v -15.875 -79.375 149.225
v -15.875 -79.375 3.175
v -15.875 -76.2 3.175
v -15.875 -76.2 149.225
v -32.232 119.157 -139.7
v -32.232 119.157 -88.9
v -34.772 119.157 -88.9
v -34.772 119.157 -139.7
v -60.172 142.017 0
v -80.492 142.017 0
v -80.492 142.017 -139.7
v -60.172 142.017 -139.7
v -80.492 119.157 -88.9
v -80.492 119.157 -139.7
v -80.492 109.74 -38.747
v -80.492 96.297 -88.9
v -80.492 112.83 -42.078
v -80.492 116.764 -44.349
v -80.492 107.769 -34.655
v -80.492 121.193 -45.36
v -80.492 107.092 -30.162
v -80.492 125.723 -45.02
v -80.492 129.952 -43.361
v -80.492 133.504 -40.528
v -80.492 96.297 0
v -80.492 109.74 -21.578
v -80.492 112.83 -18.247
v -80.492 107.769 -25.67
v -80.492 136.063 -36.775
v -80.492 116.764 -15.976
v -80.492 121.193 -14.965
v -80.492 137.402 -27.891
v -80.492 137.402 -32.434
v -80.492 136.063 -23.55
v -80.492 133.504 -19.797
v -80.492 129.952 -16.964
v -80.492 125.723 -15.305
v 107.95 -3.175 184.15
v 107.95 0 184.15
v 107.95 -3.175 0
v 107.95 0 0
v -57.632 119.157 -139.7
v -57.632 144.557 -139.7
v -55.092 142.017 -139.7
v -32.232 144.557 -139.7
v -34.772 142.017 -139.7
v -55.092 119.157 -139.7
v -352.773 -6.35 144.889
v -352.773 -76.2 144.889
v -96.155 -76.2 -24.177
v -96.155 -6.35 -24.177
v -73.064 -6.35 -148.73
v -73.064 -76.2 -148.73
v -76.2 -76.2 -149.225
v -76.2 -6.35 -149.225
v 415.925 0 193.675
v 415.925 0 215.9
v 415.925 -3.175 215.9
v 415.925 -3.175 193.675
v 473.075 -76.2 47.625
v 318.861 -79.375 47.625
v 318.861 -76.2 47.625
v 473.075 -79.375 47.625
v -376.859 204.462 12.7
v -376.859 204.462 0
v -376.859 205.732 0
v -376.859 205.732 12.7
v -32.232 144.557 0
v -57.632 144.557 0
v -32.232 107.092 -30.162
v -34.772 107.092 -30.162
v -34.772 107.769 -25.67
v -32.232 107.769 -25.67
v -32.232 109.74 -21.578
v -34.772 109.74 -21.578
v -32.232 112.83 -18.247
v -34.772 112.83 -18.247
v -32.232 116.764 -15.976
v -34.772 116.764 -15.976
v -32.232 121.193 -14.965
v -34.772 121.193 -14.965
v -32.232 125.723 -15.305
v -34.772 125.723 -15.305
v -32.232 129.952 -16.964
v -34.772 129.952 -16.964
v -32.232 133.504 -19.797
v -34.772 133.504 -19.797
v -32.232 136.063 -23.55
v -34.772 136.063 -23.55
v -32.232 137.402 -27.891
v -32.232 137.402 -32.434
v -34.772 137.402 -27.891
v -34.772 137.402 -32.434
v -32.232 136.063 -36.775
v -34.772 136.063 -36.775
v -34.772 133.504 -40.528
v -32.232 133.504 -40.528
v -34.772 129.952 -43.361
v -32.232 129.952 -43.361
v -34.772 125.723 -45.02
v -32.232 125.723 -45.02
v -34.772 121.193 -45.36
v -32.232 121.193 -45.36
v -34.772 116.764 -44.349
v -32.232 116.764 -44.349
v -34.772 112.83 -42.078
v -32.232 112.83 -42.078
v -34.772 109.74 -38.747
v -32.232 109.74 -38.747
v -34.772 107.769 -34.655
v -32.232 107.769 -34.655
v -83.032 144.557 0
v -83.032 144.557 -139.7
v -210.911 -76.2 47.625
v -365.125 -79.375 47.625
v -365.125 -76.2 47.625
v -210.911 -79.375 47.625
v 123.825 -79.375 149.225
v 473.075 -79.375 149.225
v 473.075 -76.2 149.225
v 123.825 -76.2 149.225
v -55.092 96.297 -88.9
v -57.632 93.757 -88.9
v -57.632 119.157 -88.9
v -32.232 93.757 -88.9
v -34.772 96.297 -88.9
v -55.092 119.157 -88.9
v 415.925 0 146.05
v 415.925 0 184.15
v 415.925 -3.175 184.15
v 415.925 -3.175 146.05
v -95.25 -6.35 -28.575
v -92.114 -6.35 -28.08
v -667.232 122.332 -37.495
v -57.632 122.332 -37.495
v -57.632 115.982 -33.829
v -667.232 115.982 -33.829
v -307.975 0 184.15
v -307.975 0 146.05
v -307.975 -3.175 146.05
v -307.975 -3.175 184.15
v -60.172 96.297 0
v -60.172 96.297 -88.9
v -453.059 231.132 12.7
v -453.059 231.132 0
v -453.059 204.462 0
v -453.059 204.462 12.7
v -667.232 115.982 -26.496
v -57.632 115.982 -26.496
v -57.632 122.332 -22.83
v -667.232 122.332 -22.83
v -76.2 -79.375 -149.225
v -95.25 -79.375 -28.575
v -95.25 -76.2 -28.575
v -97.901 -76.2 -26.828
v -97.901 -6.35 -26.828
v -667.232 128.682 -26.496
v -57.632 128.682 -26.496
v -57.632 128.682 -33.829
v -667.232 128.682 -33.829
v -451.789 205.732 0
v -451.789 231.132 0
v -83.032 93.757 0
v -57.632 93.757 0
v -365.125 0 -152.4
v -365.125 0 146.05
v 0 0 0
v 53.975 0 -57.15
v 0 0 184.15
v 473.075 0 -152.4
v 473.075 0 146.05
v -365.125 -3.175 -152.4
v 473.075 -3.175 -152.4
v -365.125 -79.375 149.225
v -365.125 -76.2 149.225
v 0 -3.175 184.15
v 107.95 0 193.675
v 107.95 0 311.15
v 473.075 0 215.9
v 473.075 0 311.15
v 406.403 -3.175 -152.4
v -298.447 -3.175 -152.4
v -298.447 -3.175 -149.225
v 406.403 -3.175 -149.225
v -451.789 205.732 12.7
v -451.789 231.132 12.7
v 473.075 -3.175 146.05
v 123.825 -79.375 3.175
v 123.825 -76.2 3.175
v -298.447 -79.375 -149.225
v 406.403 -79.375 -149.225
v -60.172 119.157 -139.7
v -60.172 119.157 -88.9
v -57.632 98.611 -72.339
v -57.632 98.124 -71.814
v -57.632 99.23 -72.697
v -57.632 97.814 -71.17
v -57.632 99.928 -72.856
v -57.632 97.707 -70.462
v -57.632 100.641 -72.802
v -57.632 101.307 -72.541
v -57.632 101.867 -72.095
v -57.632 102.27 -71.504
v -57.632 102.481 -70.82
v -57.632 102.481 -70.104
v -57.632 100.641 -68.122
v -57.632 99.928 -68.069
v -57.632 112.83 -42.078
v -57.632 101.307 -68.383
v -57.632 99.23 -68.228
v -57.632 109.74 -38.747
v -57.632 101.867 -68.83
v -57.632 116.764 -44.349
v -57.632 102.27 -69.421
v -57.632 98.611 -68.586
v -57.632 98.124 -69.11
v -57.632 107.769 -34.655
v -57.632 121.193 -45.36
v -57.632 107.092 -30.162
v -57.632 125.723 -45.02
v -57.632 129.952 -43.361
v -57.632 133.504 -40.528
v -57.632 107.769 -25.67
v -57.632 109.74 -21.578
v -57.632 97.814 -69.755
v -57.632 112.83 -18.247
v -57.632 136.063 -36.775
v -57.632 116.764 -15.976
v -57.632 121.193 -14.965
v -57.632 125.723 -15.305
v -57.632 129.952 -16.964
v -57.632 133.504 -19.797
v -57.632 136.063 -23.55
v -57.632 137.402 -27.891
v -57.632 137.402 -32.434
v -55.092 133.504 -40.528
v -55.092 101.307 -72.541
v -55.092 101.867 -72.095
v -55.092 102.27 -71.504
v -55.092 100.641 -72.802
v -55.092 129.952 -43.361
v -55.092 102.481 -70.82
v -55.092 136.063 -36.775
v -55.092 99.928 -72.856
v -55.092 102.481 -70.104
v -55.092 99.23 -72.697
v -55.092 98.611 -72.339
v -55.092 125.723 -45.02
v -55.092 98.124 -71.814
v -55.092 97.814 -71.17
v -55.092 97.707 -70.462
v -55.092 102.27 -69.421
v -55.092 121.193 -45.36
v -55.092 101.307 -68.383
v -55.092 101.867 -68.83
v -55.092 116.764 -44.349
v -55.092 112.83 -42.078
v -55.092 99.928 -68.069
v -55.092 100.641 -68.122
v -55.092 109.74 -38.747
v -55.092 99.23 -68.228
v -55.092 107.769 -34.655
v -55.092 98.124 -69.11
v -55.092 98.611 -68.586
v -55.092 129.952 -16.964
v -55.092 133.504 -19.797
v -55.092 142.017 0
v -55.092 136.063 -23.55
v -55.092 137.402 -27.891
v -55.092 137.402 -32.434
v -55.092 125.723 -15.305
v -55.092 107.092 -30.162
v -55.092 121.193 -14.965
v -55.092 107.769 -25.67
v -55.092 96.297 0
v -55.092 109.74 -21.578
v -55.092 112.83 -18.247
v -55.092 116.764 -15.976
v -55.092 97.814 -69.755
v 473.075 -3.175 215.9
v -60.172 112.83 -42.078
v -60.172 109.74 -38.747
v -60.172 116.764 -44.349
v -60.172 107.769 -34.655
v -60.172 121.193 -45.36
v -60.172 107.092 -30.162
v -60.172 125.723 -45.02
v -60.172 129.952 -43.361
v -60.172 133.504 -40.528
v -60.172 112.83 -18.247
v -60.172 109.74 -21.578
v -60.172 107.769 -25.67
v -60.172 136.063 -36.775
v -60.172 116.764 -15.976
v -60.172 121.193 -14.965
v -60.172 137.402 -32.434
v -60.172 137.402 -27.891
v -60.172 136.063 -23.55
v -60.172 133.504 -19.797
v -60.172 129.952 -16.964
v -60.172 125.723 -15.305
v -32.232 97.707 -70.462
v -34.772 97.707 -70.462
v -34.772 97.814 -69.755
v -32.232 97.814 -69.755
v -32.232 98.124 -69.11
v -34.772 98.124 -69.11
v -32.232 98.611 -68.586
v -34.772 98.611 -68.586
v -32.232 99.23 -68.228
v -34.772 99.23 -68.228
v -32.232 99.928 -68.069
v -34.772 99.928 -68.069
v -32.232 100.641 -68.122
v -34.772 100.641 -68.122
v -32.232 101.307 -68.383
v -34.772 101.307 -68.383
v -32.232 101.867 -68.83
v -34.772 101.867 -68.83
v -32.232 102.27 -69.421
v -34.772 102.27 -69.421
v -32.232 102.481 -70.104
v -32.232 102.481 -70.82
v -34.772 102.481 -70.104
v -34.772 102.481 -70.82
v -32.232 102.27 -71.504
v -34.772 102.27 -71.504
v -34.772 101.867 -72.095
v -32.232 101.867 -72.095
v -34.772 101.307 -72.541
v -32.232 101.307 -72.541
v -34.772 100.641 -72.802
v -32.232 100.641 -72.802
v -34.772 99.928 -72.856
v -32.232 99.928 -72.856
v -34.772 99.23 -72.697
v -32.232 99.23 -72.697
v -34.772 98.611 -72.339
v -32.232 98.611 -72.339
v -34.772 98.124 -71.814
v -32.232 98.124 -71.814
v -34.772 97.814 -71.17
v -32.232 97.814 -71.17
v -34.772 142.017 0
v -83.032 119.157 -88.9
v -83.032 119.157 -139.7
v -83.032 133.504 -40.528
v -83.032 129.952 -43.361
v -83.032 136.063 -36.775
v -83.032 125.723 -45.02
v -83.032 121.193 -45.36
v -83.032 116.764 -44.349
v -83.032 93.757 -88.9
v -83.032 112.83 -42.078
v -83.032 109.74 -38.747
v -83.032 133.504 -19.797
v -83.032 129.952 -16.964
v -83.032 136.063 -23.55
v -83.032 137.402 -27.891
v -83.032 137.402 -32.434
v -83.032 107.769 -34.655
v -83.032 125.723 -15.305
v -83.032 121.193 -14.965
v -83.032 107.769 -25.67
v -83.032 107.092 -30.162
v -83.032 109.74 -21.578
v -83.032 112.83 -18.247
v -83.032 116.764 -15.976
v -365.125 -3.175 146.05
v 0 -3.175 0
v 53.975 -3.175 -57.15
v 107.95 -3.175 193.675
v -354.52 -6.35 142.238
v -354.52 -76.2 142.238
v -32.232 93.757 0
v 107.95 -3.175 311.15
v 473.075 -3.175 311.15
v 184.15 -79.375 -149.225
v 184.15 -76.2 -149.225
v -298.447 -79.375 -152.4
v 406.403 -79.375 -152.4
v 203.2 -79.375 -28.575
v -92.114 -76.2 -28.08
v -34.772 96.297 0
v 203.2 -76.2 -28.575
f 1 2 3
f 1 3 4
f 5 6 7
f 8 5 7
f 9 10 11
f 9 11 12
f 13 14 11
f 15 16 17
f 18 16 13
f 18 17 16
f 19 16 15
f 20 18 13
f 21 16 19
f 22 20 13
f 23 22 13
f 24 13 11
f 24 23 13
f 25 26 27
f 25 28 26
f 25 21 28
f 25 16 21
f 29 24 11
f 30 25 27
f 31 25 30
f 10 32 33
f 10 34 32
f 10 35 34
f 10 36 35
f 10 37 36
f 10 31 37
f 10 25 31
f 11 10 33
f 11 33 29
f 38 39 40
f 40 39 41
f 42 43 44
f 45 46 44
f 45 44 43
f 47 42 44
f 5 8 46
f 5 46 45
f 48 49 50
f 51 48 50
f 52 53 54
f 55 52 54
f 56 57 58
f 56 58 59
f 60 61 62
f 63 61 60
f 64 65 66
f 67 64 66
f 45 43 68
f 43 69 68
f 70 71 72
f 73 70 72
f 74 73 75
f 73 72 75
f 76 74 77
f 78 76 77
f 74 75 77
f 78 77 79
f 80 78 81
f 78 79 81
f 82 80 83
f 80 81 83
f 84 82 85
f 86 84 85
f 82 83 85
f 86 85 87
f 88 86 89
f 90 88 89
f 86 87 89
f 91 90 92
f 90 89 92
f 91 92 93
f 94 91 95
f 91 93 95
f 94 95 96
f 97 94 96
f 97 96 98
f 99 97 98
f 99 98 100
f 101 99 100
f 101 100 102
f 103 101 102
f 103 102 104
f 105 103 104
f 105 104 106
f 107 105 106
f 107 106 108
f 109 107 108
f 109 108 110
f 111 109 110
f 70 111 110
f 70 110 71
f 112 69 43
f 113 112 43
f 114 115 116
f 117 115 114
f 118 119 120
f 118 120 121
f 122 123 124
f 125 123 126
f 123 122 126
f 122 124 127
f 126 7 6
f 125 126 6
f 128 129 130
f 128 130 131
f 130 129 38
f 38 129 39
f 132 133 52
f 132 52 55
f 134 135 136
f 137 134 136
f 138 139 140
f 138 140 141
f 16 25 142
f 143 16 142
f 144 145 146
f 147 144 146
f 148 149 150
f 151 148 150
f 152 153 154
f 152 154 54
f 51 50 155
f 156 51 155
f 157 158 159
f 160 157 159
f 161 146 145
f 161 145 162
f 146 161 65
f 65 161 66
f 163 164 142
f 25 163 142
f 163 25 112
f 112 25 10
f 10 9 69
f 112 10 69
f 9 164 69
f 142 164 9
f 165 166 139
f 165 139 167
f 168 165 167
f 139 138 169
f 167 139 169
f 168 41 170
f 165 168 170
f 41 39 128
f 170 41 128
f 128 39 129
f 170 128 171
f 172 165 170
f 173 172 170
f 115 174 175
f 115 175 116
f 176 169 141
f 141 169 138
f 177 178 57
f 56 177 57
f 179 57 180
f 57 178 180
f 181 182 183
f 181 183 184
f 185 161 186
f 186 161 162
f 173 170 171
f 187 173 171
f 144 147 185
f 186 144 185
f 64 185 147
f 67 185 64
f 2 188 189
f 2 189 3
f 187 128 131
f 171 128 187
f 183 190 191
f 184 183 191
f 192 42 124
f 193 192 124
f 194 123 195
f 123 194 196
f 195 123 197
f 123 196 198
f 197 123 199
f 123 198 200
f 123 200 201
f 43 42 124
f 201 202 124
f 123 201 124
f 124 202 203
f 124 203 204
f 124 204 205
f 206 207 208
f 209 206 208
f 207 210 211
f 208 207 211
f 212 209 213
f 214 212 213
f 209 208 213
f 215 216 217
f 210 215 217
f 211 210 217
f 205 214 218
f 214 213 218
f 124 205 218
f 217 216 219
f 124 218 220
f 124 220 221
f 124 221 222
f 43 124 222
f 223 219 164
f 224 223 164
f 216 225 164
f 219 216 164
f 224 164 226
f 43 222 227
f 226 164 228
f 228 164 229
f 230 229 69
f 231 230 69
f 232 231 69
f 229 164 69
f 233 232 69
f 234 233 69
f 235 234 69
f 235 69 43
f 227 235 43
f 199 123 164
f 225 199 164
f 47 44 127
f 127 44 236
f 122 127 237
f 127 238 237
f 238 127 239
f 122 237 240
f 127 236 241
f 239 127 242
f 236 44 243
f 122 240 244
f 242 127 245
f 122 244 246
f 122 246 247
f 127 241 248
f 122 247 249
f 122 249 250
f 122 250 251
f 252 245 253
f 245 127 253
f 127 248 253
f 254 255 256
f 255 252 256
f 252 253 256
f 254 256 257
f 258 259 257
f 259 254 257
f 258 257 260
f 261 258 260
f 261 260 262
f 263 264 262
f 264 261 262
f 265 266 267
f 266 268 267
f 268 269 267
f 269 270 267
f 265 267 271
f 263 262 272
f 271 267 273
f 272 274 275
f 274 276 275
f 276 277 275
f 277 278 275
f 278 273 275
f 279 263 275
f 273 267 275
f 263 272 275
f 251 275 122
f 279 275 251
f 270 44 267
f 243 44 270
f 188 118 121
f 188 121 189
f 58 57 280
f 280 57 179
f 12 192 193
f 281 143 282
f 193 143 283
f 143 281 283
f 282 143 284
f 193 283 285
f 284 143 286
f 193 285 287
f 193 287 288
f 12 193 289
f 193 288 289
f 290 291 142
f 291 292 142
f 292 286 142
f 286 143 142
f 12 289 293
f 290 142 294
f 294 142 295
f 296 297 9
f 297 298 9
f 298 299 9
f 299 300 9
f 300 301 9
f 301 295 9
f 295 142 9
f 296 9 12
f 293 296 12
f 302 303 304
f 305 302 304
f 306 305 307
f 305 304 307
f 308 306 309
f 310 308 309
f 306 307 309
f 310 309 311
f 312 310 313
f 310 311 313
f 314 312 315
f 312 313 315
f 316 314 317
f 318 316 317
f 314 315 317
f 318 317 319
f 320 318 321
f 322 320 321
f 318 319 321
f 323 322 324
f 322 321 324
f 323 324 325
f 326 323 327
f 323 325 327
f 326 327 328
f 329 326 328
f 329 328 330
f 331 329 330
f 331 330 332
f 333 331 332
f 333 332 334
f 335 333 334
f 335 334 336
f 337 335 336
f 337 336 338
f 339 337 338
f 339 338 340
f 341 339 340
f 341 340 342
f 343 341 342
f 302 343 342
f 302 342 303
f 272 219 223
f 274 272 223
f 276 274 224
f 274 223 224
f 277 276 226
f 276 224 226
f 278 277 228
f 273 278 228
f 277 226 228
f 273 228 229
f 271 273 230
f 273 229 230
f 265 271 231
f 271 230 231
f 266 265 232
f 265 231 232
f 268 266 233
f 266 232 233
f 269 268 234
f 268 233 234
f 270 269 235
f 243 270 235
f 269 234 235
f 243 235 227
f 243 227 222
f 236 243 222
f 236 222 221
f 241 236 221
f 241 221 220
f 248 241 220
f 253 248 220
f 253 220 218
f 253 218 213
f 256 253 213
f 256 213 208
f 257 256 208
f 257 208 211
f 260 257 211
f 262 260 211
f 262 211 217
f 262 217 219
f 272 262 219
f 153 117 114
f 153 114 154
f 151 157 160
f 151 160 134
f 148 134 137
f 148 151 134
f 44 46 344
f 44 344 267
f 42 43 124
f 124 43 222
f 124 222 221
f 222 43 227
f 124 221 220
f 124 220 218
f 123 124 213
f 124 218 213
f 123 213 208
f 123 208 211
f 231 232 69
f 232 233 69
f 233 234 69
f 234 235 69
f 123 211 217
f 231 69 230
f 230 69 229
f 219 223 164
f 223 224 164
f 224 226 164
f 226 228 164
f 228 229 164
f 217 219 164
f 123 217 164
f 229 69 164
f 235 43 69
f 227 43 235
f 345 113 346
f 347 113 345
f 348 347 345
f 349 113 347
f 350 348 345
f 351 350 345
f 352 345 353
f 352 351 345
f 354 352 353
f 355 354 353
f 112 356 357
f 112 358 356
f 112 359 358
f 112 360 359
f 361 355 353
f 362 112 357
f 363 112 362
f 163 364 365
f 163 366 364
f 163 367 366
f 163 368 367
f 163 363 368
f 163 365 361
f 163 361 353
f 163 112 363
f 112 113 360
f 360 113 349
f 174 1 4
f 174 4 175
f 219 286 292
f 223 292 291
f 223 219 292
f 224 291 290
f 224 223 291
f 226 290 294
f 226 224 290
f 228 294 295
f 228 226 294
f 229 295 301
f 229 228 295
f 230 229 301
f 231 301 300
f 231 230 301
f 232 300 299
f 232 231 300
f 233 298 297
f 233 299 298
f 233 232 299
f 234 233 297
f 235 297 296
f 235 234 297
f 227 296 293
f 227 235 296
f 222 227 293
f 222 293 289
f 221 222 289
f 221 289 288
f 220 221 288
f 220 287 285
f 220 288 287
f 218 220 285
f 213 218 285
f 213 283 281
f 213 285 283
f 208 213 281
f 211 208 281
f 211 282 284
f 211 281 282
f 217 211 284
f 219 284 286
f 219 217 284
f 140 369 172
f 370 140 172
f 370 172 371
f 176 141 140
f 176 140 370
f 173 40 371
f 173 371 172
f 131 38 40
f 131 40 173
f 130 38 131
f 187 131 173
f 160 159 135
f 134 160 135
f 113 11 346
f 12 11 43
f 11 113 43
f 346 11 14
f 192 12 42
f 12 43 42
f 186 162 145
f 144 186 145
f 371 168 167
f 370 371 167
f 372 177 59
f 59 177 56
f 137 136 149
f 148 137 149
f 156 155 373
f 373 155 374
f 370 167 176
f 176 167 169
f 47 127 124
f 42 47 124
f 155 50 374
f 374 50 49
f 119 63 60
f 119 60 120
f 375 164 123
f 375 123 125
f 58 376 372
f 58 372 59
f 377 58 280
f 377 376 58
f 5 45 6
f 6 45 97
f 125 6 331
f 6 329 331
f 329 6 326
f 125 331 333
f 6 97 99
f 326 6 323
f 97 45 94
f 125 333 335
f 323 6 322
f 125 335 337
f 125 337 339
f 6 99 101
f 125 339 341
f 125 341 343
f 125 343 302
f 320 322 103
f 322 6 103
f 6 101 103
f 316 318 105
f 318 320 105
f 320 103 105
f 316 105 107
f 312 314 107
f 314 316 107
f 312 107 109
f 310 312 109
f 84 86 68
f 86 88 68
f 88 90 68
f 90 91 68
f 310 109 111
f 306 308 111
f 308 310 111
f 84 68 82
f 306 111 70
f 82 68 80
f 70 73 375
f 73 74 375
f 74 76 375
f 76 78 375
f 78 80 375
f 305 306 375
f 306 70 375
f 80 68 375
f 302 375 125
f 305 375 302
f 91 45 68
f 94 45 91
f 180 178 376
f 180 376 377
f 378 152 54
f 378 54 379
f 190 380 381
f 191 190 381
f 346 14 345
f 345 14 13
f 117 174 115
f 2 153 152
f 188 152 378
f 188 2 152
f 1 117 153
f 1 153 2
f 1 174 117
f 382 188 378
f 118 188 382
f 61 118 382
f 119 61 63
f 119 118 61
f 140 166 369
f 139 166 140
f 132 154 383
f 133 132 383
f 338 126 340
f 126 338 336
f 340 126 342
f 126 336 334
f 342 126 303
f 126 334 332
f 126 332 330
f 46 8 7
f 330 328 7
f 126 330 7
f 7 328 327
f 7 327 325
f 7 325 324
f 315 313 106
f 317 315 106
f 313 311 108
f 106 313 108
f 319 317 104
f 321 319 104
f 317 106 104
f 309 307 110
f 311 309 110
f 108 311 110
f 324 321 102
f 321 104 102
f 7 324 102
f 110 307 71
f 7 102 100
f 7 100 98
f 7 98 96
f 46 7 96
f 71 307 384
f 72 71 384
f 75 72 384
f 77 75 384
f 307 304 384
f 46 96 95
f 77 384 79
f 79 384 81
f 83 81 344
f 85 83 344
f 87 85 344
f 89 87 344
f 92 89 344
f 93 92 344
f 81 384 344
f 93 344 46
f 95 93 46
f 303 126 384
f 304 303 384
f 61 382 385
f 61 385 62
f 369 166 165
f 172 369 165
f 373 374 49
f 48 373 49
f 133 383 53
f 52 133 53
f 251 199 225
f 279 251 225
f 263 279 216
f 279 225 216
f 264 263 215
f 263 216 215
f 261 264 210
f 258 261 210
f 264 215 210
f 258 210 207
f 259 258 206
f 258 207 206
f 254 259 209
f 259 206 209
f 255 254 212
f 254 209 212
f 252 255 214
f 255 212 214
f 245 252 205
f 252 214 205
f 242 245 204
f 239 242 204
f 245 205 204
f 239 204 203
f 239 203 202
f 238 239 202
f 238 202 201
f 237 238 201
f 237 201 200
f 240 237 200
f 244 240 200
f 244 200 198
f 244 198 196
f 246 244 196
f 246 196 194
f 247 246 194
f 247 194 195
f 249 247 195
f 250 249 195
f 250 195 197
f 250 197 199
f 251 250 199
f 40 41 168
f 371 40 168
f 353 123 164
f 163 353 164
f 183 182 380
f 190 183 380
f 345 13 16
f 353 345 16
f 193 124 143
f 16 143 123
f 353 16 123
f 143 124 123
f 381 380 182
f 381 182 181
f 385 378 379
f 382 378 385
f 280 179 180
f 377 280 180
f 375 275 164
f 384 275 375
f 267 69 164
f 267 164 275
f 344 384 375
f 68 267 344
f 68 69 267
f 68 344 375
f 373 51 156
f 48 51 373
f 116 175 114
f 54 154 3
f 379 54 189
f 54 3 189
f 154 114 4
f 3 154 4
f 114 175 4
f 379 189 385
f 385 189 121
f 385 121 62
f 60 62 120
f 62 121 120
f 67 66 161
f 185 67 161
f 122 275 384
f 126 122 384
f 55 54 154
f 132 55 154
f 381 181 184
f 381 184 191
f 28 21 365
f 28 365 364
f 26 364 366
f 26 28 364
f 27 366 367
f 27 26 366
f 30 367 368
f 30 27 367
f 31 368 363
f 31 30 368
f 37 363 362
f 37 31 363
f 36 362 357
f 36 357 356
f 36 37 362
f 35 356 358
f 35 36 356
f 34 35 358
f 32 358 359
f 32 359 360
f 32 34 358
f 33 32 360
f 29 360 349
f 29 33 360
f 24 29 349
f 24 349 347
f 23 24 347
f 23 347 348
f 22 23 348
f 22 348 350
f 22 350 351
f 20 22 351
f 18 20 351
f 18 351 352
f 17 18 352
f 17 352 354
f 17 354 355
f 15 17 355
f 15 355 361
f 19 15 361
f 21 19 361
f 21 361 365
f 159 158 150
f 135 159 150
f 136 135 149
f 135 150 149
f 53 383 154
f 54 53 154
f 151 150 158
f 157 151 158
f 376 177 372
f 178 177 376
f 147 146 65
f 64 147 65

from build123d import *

# Parameters (mm, degrees)
F1_DEPTH  = 3.175
F2_W      = 704.85
F2_H      = 76.2
F3_DEPTH  = 3.175
F0_W      = 365.125
F0_H      = 117.475
F4_DEPTH  = 3.175
F6_DEPTH  = 3.175
F8_DEPTH  = 69.85
F10_DEPTH = 69.85
F11_W     = 25.4
F11_H     = 50.8
F11_W_2   = 20.32
F11_H_2   = 45.72
F12_DEPTH = 88.9
F13_R     = 15.24
F13_R_2   = 2.4003
F14_DEPTH = 25.4
F16_DEPTH = 609.6
F17_W     = 57.15
F17_H     = 38.1
F17_H_2   = 31.75
F18_DEPTH = 3.175
F20_DEPTH = 12.7
F22_DEPTH = 50.8
F23_R     = 15.24
F24_DEPTH = 25.4
F25_W     = 20.32
F25_H     = 45.72
F26_DEPTH = 139.7


# Not quite as in the source:
# - a length typed as a fraction of an inch, garbled in the dataset ("3 / 203.2 mm" for 3/8 in), is restored


with BuildPart() as f1:
    # F0 (on Front) → F1 (new body)
    with BuildSketch(Plane.XZ):
        Polygon((0, 184.15), (-365.125, 184.15), (-365.125, -152.4), (473.075, -152.4), (473.075, 184.15), (107.95, 184.15), (107.95, 0), (53.975, -57.15), (0, 0), align=None)
    extrude(amount=F1_DEPTH)


with BuildPart() as f3:
    # F2 (on face) → F3 (new body)
    with BuildSketch(Plane(origin=(0, 0, -152.4), x_dir=(1, 0, 0), z_dir=(0, 0, -1))):
        with Locations((53.9782664609, 41.275)):
            Rectangle(F2_W, F2_H)
    extrude(amount=-F3_DEPTH)


with BuildPart() as f4:
    # F0 (on Front) → F4 (new body)
    with BuildSketch(Plane.XZ):
        with Locations((290.5125, 252.4125)):
            Rectangle(F0_W, F0_H)
    extrude(amount=F4_DEPTH)


with BuildPart() as f6:
    # F5 (on face) → F6 (new body)
    with BuildSketch(Plane.XZ.offset(79.375)):
        Polygon((-15.875, 3.175), (-15.875, 149.225), (-365.125, 149.225), (-210.9107142857, 47.625), (-95.25, -28.575), (-76.2, -149.225), (184.15, -149.225), (203.2, -28.575), (318.8607142857, 47.625), (473.075, 149.225), (123.825, 149.225), (123.825, 3.175), align=None)
        Polygon((-210.9107142857, 47.625), (-365.125, 149.225), (-365.125, 47.625), align=None)
        Polygon((473.075, 47.625), (473.075, 149.225), (318.8607142857, 47.625), align=None)
    extrude(amount=-F6_DEPTH)


with BuildPart() as f8:
    # F7 (on face) → F8 (new body)
    with BuildSketch(Plane(origin=(0, -76.2, 0), x_dir=(-1, 0, 0), z_dir=(0, 1, 0))):
        Polygon((76.2, -149.225), (95.25, -28.575), (92.1138525851, -28.0798188292), (73.0638525851, -148.7298188292), align=None)
    extrude(amount=F8_DEPTH)


with BuildPart() as f10:
    # F9 (on face) → F10 (new body)
    with BuildSketch(Plane(origin=(0, -76.2, 0), x_dir=(-1, 0, 0), z_dir=(0, 1, 0))):
        Polygon((210.9107142857, 47.625), (354.5197280439, 142.2379972995), (352.7729773688, 144.8893152885), (96.1545673139, -24.1769313358), (97.901317989, -26.8282493249), align=None)
    extrude(amount=F10_DEPTH)


with BuildPart() as f12:
    # F11 (on Top) → F12 (new body)
    with BuildSketch(Plane.XY):
        with Locations((-44.9317730963, 119.1572592371)):
            Rectangle(F11_W, F11_H)
        with Locations((-44.9317730963, 119.1572592371)):
            Rectangle(F11_W_2, F11_H_2, mode=Mode.SUBTRACT)
    extrude(amount=-F12_DEPTH)

    # F13 (on face) → F14 (cut, through all)
    with BuildSketch(Plane(origin=(-57.6317730963, 0, 0), x_dir=(0, -1, 0), z_dir=(-1, 0, 0))):
        with Locations((-122.3322592371, -30.1625)):
            Circle(F13_R)
        with Locations((-100.1072592371, -70.46214)):
            Circle(F13_R_2)
    extrude(amount=-F14_DEPTH, mode=Mode.SUBTRACT)

    # F21 (on face) → F22 (join)
    with BuildSketch(Plane(origin=(0, 0, -88.9), x_dir=(1, 0, 0), z_dir=(0, 0, -1))):
        Polygon((-34.7717730963, -142.0172592371), (-55.0917730963, -142.0172592371), (-55.0917730963, -119.1572592371), (-57.6317730963, -119.1572592371), (-57.6317730963, -144.5572592371), (-32.2317730963, -144.5572592371), (-32.2317730963, -119.1572592371), (-34.7717730963, -119.1572592371), align=None)
    extrude(amount=F22_DEPTH)


with BuildPart() as f16:
    # F15 (on face) → F16 (new body)
    with BuildSketch(Plane(origin=(-57.6317730963, 0, 0), x_dir=(0, -1, 0), z_dir=(-1, 0, 0))):
        Polygon((-122.3322592371, -37.4948484187), (-115.9822592371, -33.8286742094), (-115.9822592371, -26.4963257906), (-122.3322592371, -22.8301515813), (-128.6822592371, -26.4963257906), (-128.6822592371, -33.8286742094), align=None)
    extrude(amount=F16_DEPTH)


with BuildPart() as f18_tool:
    # F17 (on face) → F18 (new body, through all)
    with BuildSketch(Plane.XZ):
        with Locations((444.5, 165.1)):
            Rectangle(F17_W, F17_H)
        with Locations((444.5, 200.025)):
            Rectangle(F17_W, F17_H_2)
        with Locations((-336.55, 165.1)):
            Rectangle(F17_W, F17_H)
    extrude(amount=F18_DEPTH)


with BuildPart() as f1_1:
    add(f1.part)

    # F18: cut by f18_tool
    add(f18_tool.part, mode=Mode.SUBTRACT)


with BuildPart() as f4_1:
    add(f4.part)

    # F18: cut by f18_tool
    add(f18_tool.part, mode=Mode.SUBTRACT)


with BuildPart() as f20:
    # F19 (on Top) → F20 (new body)
    with BuildSketch(Plane.XY):
        Polygon((-451.7894704658, 231.1321839183), (-453.0594704658, 231.1321839183), (-453.0594704658, 204.4621839183), (-376.8594704658, 204.4621839183), (-376.8594704658, 205.7321839183), (-451.7894704658, 205.7321839183), align=None)
    extrude(amount=F20_DEPTH)


with BuildPart() as f24:
    # F23 (on face) → F24 (new body)
    with BuildSketch(Plane(origin=(-57.6317730963, 0, 0), x_dir=(0, -1, 0), z_dir=(-1, 0, 0))):
        Polygon((-119.1572592371, -139.7), (-119.1572592371, -88.9), (-93.7572592371, -88.9), (-93.7572592371, 0), (-144.5572592371, 0), (-144.5572592371, -139.7), align=None)
        with Locations((-122.3322592371, -30.1625)):
            Circle(F23_R, mode=Mode.SUBTRACT)
    extrude(amount=F24_DEPTH)

    # F25 (on face) → F26 (cut, through all)
    with BuildSketch(Plane.XY):
        with Locations((-70.3317730963, 119.1572592371)):
            Rectangle(F25_W, F25_H)
    extrude(amount=-F26_DEPTH, mode=Mode.SUBTRACT)


solid = Compound([f3.part, f6.part, f8.part, f10.part, f12.part, f16.part, f1_1.part, f4_1.part, f20.part, f24.part])
